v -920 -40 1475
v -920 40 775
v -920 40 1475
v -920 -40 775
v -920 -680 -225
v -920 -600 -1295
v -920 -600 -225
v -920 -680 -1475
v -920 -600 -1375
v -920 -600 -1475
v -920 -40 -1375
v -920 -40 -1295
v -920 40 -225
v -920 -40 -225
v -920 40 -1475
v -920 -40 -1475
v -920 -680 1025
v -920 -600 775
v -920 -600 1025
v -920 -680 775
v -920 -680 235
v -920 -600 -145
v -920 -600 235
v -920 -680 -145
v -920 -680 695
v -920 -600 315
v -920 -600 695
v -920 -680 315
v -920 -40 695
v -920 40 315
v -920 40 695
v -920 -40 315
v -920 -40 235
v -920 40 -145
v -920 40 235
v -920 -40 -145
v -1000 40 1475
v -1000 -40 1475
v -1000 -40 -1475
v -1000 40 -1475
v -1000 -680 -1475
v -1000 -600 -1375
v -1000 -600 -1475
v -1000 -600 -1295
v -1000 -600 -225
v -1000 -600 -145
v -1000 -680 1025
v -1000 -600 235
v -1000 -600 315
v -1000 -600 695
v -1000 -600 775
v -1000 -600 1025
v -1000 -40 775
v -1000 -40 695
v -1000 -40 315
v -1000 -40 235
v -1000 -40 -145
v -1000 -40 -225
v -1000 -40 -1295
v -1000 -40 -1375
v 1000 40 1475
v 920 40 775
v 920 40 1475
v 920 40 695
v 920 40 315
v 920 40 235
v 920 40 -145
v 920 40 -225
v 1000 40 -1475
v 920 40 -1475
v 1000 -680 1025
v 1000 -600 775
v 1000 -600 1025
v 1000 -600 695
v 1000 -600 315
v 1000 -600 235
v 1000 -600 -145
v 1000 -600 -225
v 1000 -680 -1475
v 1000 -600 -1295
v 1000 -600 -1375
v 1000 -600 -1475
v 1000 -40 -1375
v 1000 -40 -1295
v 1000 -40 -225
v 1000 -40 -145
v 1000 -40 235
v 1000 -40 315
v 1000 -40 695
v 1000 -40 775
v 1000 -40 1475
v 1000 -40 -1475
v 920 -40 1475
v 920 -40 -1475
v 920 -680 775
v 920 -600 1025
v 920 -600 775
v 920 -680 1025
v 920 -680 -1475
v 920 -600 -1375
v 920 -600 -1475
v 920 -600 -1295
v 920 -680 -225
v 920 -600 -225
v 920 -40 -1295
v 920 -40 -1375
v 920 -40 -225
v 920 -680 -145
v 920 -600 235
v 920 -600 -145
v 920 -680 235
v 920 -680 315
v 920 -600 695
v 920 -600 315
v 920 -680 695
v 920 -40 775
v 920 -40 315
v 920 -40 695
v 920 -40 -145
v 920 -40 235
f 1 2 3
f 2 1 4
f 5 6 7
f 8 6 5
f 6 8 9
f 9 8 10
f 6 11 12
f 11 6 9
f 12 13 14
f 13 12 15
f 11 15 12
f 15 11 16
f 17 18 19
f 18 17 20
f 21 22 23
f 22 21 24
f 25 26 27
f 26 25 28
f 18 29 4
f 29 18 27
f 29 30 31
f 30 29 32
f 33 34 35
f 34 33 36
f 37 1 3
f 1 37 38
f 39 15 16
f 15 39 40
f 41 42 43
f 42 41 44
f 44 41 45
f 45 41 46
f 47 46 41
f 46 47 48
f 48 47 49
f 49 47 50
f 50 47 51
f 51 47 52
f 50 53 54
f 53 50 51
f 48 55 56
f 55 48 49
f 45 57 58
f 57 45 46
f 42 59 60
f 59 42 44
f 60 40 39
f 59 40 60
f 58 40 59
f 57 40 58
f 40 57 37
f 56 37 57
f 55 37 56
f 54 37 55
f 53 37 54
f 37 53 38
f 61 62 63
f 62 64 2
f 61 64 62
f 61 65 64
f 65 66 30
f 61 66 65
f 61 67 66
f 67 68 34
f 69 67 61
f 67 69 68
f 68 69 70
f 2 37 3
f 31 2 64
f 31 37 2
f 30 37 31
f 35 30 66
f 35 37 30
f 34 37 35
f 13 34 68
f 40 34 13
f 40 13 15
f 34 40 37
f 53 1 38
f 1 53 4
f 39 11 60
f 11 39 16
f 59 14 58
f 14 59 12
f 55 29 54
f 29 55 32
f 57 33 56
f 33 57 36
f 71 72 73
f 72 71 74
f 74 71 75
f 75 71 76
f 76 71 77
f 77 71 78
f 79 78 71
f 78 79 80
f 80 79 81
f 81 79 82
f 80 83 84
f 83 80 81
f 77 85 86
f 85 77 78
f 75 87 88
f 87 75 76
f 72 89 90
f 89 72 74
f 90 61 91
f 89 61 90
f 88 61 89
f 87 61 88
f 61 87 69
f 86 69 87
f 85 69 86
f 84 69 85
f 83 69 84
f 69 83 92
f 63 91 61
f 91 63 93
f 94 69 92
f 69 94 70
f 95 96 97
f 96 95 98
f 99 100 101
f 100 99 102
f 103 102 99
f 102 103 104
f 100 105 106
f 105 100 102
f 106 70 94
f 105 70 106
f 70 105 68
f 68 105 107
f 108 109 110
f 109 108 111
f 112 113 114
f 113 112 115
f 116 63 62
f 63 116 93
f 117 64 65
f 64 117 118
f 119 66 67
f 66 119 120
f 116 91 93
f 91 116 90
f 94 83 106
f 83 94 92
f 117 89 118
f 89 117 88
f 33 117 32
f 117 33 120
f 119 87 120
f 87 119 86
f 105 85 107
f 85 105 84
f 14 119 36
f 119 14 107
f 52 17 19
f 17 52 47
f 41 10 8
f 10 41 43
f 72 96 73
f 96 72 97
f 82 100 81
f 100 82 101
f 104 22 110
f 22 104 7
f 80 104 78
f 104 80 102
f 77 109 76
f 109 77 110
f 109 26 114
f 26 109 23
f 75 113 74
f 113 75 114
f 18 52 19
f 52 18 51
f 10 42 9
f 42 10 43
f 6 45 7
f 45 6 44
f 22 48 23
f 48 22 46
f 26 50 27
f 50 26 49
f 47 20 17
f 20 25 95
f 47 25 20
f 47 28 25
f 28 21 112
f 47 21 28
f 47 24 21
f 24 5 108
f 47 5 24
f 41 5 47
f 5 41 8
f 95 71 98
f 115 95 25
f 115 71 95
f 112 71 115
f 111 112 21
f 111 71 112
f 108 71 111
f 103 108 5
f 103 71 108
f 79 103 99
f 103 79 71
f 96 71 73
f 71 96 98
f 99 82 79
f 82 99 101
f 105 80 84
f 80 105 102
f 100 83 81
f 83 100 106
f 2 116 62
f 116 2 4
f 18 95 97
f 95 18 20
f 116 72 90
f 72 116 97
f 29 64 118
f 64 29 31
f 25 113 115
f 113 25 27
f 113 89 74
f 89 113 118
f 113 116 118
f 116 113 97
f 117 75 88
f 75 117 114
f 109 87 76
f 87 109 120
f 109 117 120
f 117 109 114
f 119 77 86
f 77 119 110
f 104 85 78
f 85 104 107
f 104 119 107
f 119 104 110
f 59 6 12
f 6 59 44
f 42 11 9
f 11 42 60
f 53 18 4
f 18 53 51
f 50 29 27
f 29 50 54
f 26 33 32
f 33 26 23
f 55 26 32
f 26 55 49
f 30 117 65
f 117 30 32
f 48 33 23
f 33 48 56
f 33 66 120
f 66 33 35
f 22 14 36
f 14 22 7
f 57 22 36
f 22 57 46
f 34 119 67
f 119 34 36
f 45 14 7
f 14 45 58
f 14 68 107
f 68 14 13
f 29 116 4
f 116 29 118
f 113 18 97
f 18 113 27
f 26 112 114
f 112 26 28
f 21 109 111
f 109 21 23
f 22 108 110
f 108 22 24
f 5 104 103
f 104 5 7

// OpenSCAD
// file: ../library/modules.scad
module box(width, length, height, wallThickness, open = "top") {    
    // inner core in the center, equals to open == "none"
    innerHeight = open == "bottom" ? height+1 : (open == "top" ? height+1 : height);
    innerZ = open == "bottom" ? -wallThickness : (open == "top" ? wallThickness : 0);


    innerWidth = open == "left" ? width+1 : (open == "right" ? width+1 : width);
    innerX = open == "left" ? -wallThickness : (open == "right" ? wallThickness : 0);

    innerLength = open == "front" ? length+1 : (open == "back" ? length+1 : length);
    innerY = open == "front" ? -wallThickness : (open == "back" ? wallThickness : 0);


    translate([0, 0, height / 2 + wallThickness])
    difference() {
        cube(size = [length + 2 * wallThickness, width + 2 * wallThickness, height + 2 * wallThickness], center = true);
        translate([innerX, innerY, innerZ])
            cube(size = [innerLength, innerWidth, innerHeight], center = true);
    }
}


module prism(l, w, h) {
       polyhedron(points=[
               [0,0,h],           // 0    front top corner
               [0,0,0],[w,0,0],   // 1, 2 front left & right bottom corners
               [0,l,h],           // 3    back top corner
               [0,l,0],[w,l,0]    // 4, 5 back left & right bottom corners
       ], faces=[ // points for all faces must be ordered clockwise when looking in
               [0,2,1],    // top face
               [3,4,5],    // base face
               [0,1,4,3],  // h face
               [1,2,5,4],  // w face
               [0,3,5,2],  // hypotenuse face
       ]);
}

module boardMitreJoints(length, width, thickness) {
    // lower board with mitre joint
    cube(size = [length, width, thickness]);
    //difference() {
    //    cube(size = [length, width, thickness]);
    //    translate([0, 0, thickness]) rotate([0,90,0]) prism(width+100, thickness, thickness);
    //    translate([length, 0, thickness]) rotate([0,-180,0]) prism(width+100, thickness, thickness);
    //};
}
// main file
include <../library/modules.scad>


module regal(width, length, height, logThickness) {
    // überstand seitlich
    overhang = 250;
    // Höhenunterschied Dach
    heightDiff = 450;
    // Abstand von Unten bis zur untersten Querstrebe
    supportLowerSpace = 100;
    // Abstand von Oben/Vorne bis zur obersten Querstrebe
    supportUpperSpace = 250;
    // Höhe der Kajaks
    kajakHeight=380;


    // breite minus überstand seitlich geteilt durch zwei, wird Intern benötigt um die Pfosten zu positionieren
    moveLeg = (width - (2 * overhang) - logThickness) / 2;
    // Tablar Abstand
    shellIncrement = kajakHeight + logThickness;

    // pfosten hinten
    // links
    translate([-moveLeg, 0, 0])
        cube(size = [logThickness, logThickness, height], center = true);
    // rechts
    translate([moveLeg, 0, 0])
        cube(size = [logThickness, logThickness, height], center = true);

    // pfosten vorne
    // links
    translate([-moveLeg, -length, - heightDiff / 2])
        cube(size = [logThickness, logThickness, height - heightDiff], center = true);
    // rechts
    translate([moveLeg, -length, - heightDiff / 2])
        cube(size = [logThickness, logThickness, height - heightDiff], center = true);


    // querstreben
    // links unten
    translate([moveLeg, -length / 2, 0])
        translate([0, 0, - (height / 2) + (logThickness / 2) + supportLowerSpace])
            cube(size = [logThickness, length, logThickness], center = true);



    // links oben
    translate([moveLeg, -length / 2, 0])
        // oben
        translate([0, 0, (height / 2 - logThickness / 2) - heightDiff - supportUpperSpace])
            cube(size = [logThickness, length, logThickness], center = true);
    
    // links erstes Tablar
    translate([moveLeg, -length / 2, 0])
        // oben
        translate([0, 0, (height / 2 - logThickness / 2) - heightDiff - supportUpperSpace - shellIncrement])
            cube(size = [logThickness, length, logThickness], center = true);

    // links zweites Tablar
    translate([moveLeg, -length / 2, 0])
        // oben
        translate([0, 0, (height / 2 - logThickness / 2) - heightDiff - supportUpperSpace - (shellIncrement * 2)])
            cube(size = [logThickness, length, logThickness], center = true);







    // rechts unten
    translate([-moveLeg, -length / 2, 0])
        translate([0, 0, - (height / 2) + (logThickness / 2) + supportLowerSpace])
            cube(size = [logThickness, length, logThickness], center = true);
        
    // rechts oben
    translate([-moveLeg, -length / 2, 0])
        // oben
        translate([0, 0, (height / 2 - logThickness / 2) - heightDiff - supportUpperSpace])
            cube(size = [logThickness, length, logThickness], center = true);

    // rechts erstes Tablar
    translate([-moveLeg, -length / 2, 0])
        // oben
        translate([0, 0, (height / 2 - logThickness / 2) - heightDiff - supportUpperSpace - shellIncrement])
            cube(size = [logThickness, length, logThickness], center = true);

    // rechts zweites Tablar
    translate([-moveLeg, -length / 2, 0])
        // oben
        translate([0, 0, (height / 2 - logThickness / 2) - heightDiff - supportUpperSpace - (shellIncrement * 2)])
            cube(size = [logThickness, length, logThickness], center = true);



    // streben längs
    // hinten oben 
    translate([0, 0, (height / 2 - logThickness / 2) - heightDiff - supportUpperSpace])
        cube(size = [width - (overhang * 2), logThickness, logThickness], center = true);

    // hinten erstes Tablar
    translate([0, 0, (height / 2 - logThickness / 2) - heightDiff - supportUpperSpace - shellIncrement])
        cube(size = [width - (overhang * 2), logThickness, logThickness], center = true);

    // hinten zweites Tablar
    translate([0, 0, (height / 2 - logThickness / 2) - heightDiff - supportUpperSpace - (shellIncrement * 2)])
        cube(size = [width - (overhang * 2), logThickness, logThickness], center = true);


    // vorne oben 
    translate([0, - length, (height / 2 - logThickness / 2) - heightDiff - supportUpperSpace])
        cube(size = [width - (overhang * 2), logThickness, logThickness], center = true);

    // vorne erstes Tablar
    translate([0, - length, (height / 2 - logThickness / 2) - heightDiff - supportUpperSpace - shellIncrement])
        cube(size = [width - (overhang * 2), logThickness, logThickness], center = true);

    // vorne zweites Tablar
    translate([0, - length, (height / 2 - logThickness / 2) - heightDiff - supportUpperSpace - (shellIncrement * 2)])
        cube(size = [width - (overhang * 2), logThickness, logThickness], center = true);


    module partsList() {
        // Beine Hinten
        echo(str("Beine Hinten", " ", "2", " ", height, " ", logThickness, " ", logThickness));
        echo(str("Beine Vorne", " ", "2", " ", height - heightDiff, " ", logThickness, " ", logThickness));
        echo(str("Quer-Streben", " ", "8", " ", length, " ", logThickness, " ", logThickness));
        echo(str("Längs-Streben", " ", "6", " ", width - (overhang * 2), " ", logThickness, " ", logThickness));
    }

    partsList();



}


regal(2500, 640, 2950, 80);
